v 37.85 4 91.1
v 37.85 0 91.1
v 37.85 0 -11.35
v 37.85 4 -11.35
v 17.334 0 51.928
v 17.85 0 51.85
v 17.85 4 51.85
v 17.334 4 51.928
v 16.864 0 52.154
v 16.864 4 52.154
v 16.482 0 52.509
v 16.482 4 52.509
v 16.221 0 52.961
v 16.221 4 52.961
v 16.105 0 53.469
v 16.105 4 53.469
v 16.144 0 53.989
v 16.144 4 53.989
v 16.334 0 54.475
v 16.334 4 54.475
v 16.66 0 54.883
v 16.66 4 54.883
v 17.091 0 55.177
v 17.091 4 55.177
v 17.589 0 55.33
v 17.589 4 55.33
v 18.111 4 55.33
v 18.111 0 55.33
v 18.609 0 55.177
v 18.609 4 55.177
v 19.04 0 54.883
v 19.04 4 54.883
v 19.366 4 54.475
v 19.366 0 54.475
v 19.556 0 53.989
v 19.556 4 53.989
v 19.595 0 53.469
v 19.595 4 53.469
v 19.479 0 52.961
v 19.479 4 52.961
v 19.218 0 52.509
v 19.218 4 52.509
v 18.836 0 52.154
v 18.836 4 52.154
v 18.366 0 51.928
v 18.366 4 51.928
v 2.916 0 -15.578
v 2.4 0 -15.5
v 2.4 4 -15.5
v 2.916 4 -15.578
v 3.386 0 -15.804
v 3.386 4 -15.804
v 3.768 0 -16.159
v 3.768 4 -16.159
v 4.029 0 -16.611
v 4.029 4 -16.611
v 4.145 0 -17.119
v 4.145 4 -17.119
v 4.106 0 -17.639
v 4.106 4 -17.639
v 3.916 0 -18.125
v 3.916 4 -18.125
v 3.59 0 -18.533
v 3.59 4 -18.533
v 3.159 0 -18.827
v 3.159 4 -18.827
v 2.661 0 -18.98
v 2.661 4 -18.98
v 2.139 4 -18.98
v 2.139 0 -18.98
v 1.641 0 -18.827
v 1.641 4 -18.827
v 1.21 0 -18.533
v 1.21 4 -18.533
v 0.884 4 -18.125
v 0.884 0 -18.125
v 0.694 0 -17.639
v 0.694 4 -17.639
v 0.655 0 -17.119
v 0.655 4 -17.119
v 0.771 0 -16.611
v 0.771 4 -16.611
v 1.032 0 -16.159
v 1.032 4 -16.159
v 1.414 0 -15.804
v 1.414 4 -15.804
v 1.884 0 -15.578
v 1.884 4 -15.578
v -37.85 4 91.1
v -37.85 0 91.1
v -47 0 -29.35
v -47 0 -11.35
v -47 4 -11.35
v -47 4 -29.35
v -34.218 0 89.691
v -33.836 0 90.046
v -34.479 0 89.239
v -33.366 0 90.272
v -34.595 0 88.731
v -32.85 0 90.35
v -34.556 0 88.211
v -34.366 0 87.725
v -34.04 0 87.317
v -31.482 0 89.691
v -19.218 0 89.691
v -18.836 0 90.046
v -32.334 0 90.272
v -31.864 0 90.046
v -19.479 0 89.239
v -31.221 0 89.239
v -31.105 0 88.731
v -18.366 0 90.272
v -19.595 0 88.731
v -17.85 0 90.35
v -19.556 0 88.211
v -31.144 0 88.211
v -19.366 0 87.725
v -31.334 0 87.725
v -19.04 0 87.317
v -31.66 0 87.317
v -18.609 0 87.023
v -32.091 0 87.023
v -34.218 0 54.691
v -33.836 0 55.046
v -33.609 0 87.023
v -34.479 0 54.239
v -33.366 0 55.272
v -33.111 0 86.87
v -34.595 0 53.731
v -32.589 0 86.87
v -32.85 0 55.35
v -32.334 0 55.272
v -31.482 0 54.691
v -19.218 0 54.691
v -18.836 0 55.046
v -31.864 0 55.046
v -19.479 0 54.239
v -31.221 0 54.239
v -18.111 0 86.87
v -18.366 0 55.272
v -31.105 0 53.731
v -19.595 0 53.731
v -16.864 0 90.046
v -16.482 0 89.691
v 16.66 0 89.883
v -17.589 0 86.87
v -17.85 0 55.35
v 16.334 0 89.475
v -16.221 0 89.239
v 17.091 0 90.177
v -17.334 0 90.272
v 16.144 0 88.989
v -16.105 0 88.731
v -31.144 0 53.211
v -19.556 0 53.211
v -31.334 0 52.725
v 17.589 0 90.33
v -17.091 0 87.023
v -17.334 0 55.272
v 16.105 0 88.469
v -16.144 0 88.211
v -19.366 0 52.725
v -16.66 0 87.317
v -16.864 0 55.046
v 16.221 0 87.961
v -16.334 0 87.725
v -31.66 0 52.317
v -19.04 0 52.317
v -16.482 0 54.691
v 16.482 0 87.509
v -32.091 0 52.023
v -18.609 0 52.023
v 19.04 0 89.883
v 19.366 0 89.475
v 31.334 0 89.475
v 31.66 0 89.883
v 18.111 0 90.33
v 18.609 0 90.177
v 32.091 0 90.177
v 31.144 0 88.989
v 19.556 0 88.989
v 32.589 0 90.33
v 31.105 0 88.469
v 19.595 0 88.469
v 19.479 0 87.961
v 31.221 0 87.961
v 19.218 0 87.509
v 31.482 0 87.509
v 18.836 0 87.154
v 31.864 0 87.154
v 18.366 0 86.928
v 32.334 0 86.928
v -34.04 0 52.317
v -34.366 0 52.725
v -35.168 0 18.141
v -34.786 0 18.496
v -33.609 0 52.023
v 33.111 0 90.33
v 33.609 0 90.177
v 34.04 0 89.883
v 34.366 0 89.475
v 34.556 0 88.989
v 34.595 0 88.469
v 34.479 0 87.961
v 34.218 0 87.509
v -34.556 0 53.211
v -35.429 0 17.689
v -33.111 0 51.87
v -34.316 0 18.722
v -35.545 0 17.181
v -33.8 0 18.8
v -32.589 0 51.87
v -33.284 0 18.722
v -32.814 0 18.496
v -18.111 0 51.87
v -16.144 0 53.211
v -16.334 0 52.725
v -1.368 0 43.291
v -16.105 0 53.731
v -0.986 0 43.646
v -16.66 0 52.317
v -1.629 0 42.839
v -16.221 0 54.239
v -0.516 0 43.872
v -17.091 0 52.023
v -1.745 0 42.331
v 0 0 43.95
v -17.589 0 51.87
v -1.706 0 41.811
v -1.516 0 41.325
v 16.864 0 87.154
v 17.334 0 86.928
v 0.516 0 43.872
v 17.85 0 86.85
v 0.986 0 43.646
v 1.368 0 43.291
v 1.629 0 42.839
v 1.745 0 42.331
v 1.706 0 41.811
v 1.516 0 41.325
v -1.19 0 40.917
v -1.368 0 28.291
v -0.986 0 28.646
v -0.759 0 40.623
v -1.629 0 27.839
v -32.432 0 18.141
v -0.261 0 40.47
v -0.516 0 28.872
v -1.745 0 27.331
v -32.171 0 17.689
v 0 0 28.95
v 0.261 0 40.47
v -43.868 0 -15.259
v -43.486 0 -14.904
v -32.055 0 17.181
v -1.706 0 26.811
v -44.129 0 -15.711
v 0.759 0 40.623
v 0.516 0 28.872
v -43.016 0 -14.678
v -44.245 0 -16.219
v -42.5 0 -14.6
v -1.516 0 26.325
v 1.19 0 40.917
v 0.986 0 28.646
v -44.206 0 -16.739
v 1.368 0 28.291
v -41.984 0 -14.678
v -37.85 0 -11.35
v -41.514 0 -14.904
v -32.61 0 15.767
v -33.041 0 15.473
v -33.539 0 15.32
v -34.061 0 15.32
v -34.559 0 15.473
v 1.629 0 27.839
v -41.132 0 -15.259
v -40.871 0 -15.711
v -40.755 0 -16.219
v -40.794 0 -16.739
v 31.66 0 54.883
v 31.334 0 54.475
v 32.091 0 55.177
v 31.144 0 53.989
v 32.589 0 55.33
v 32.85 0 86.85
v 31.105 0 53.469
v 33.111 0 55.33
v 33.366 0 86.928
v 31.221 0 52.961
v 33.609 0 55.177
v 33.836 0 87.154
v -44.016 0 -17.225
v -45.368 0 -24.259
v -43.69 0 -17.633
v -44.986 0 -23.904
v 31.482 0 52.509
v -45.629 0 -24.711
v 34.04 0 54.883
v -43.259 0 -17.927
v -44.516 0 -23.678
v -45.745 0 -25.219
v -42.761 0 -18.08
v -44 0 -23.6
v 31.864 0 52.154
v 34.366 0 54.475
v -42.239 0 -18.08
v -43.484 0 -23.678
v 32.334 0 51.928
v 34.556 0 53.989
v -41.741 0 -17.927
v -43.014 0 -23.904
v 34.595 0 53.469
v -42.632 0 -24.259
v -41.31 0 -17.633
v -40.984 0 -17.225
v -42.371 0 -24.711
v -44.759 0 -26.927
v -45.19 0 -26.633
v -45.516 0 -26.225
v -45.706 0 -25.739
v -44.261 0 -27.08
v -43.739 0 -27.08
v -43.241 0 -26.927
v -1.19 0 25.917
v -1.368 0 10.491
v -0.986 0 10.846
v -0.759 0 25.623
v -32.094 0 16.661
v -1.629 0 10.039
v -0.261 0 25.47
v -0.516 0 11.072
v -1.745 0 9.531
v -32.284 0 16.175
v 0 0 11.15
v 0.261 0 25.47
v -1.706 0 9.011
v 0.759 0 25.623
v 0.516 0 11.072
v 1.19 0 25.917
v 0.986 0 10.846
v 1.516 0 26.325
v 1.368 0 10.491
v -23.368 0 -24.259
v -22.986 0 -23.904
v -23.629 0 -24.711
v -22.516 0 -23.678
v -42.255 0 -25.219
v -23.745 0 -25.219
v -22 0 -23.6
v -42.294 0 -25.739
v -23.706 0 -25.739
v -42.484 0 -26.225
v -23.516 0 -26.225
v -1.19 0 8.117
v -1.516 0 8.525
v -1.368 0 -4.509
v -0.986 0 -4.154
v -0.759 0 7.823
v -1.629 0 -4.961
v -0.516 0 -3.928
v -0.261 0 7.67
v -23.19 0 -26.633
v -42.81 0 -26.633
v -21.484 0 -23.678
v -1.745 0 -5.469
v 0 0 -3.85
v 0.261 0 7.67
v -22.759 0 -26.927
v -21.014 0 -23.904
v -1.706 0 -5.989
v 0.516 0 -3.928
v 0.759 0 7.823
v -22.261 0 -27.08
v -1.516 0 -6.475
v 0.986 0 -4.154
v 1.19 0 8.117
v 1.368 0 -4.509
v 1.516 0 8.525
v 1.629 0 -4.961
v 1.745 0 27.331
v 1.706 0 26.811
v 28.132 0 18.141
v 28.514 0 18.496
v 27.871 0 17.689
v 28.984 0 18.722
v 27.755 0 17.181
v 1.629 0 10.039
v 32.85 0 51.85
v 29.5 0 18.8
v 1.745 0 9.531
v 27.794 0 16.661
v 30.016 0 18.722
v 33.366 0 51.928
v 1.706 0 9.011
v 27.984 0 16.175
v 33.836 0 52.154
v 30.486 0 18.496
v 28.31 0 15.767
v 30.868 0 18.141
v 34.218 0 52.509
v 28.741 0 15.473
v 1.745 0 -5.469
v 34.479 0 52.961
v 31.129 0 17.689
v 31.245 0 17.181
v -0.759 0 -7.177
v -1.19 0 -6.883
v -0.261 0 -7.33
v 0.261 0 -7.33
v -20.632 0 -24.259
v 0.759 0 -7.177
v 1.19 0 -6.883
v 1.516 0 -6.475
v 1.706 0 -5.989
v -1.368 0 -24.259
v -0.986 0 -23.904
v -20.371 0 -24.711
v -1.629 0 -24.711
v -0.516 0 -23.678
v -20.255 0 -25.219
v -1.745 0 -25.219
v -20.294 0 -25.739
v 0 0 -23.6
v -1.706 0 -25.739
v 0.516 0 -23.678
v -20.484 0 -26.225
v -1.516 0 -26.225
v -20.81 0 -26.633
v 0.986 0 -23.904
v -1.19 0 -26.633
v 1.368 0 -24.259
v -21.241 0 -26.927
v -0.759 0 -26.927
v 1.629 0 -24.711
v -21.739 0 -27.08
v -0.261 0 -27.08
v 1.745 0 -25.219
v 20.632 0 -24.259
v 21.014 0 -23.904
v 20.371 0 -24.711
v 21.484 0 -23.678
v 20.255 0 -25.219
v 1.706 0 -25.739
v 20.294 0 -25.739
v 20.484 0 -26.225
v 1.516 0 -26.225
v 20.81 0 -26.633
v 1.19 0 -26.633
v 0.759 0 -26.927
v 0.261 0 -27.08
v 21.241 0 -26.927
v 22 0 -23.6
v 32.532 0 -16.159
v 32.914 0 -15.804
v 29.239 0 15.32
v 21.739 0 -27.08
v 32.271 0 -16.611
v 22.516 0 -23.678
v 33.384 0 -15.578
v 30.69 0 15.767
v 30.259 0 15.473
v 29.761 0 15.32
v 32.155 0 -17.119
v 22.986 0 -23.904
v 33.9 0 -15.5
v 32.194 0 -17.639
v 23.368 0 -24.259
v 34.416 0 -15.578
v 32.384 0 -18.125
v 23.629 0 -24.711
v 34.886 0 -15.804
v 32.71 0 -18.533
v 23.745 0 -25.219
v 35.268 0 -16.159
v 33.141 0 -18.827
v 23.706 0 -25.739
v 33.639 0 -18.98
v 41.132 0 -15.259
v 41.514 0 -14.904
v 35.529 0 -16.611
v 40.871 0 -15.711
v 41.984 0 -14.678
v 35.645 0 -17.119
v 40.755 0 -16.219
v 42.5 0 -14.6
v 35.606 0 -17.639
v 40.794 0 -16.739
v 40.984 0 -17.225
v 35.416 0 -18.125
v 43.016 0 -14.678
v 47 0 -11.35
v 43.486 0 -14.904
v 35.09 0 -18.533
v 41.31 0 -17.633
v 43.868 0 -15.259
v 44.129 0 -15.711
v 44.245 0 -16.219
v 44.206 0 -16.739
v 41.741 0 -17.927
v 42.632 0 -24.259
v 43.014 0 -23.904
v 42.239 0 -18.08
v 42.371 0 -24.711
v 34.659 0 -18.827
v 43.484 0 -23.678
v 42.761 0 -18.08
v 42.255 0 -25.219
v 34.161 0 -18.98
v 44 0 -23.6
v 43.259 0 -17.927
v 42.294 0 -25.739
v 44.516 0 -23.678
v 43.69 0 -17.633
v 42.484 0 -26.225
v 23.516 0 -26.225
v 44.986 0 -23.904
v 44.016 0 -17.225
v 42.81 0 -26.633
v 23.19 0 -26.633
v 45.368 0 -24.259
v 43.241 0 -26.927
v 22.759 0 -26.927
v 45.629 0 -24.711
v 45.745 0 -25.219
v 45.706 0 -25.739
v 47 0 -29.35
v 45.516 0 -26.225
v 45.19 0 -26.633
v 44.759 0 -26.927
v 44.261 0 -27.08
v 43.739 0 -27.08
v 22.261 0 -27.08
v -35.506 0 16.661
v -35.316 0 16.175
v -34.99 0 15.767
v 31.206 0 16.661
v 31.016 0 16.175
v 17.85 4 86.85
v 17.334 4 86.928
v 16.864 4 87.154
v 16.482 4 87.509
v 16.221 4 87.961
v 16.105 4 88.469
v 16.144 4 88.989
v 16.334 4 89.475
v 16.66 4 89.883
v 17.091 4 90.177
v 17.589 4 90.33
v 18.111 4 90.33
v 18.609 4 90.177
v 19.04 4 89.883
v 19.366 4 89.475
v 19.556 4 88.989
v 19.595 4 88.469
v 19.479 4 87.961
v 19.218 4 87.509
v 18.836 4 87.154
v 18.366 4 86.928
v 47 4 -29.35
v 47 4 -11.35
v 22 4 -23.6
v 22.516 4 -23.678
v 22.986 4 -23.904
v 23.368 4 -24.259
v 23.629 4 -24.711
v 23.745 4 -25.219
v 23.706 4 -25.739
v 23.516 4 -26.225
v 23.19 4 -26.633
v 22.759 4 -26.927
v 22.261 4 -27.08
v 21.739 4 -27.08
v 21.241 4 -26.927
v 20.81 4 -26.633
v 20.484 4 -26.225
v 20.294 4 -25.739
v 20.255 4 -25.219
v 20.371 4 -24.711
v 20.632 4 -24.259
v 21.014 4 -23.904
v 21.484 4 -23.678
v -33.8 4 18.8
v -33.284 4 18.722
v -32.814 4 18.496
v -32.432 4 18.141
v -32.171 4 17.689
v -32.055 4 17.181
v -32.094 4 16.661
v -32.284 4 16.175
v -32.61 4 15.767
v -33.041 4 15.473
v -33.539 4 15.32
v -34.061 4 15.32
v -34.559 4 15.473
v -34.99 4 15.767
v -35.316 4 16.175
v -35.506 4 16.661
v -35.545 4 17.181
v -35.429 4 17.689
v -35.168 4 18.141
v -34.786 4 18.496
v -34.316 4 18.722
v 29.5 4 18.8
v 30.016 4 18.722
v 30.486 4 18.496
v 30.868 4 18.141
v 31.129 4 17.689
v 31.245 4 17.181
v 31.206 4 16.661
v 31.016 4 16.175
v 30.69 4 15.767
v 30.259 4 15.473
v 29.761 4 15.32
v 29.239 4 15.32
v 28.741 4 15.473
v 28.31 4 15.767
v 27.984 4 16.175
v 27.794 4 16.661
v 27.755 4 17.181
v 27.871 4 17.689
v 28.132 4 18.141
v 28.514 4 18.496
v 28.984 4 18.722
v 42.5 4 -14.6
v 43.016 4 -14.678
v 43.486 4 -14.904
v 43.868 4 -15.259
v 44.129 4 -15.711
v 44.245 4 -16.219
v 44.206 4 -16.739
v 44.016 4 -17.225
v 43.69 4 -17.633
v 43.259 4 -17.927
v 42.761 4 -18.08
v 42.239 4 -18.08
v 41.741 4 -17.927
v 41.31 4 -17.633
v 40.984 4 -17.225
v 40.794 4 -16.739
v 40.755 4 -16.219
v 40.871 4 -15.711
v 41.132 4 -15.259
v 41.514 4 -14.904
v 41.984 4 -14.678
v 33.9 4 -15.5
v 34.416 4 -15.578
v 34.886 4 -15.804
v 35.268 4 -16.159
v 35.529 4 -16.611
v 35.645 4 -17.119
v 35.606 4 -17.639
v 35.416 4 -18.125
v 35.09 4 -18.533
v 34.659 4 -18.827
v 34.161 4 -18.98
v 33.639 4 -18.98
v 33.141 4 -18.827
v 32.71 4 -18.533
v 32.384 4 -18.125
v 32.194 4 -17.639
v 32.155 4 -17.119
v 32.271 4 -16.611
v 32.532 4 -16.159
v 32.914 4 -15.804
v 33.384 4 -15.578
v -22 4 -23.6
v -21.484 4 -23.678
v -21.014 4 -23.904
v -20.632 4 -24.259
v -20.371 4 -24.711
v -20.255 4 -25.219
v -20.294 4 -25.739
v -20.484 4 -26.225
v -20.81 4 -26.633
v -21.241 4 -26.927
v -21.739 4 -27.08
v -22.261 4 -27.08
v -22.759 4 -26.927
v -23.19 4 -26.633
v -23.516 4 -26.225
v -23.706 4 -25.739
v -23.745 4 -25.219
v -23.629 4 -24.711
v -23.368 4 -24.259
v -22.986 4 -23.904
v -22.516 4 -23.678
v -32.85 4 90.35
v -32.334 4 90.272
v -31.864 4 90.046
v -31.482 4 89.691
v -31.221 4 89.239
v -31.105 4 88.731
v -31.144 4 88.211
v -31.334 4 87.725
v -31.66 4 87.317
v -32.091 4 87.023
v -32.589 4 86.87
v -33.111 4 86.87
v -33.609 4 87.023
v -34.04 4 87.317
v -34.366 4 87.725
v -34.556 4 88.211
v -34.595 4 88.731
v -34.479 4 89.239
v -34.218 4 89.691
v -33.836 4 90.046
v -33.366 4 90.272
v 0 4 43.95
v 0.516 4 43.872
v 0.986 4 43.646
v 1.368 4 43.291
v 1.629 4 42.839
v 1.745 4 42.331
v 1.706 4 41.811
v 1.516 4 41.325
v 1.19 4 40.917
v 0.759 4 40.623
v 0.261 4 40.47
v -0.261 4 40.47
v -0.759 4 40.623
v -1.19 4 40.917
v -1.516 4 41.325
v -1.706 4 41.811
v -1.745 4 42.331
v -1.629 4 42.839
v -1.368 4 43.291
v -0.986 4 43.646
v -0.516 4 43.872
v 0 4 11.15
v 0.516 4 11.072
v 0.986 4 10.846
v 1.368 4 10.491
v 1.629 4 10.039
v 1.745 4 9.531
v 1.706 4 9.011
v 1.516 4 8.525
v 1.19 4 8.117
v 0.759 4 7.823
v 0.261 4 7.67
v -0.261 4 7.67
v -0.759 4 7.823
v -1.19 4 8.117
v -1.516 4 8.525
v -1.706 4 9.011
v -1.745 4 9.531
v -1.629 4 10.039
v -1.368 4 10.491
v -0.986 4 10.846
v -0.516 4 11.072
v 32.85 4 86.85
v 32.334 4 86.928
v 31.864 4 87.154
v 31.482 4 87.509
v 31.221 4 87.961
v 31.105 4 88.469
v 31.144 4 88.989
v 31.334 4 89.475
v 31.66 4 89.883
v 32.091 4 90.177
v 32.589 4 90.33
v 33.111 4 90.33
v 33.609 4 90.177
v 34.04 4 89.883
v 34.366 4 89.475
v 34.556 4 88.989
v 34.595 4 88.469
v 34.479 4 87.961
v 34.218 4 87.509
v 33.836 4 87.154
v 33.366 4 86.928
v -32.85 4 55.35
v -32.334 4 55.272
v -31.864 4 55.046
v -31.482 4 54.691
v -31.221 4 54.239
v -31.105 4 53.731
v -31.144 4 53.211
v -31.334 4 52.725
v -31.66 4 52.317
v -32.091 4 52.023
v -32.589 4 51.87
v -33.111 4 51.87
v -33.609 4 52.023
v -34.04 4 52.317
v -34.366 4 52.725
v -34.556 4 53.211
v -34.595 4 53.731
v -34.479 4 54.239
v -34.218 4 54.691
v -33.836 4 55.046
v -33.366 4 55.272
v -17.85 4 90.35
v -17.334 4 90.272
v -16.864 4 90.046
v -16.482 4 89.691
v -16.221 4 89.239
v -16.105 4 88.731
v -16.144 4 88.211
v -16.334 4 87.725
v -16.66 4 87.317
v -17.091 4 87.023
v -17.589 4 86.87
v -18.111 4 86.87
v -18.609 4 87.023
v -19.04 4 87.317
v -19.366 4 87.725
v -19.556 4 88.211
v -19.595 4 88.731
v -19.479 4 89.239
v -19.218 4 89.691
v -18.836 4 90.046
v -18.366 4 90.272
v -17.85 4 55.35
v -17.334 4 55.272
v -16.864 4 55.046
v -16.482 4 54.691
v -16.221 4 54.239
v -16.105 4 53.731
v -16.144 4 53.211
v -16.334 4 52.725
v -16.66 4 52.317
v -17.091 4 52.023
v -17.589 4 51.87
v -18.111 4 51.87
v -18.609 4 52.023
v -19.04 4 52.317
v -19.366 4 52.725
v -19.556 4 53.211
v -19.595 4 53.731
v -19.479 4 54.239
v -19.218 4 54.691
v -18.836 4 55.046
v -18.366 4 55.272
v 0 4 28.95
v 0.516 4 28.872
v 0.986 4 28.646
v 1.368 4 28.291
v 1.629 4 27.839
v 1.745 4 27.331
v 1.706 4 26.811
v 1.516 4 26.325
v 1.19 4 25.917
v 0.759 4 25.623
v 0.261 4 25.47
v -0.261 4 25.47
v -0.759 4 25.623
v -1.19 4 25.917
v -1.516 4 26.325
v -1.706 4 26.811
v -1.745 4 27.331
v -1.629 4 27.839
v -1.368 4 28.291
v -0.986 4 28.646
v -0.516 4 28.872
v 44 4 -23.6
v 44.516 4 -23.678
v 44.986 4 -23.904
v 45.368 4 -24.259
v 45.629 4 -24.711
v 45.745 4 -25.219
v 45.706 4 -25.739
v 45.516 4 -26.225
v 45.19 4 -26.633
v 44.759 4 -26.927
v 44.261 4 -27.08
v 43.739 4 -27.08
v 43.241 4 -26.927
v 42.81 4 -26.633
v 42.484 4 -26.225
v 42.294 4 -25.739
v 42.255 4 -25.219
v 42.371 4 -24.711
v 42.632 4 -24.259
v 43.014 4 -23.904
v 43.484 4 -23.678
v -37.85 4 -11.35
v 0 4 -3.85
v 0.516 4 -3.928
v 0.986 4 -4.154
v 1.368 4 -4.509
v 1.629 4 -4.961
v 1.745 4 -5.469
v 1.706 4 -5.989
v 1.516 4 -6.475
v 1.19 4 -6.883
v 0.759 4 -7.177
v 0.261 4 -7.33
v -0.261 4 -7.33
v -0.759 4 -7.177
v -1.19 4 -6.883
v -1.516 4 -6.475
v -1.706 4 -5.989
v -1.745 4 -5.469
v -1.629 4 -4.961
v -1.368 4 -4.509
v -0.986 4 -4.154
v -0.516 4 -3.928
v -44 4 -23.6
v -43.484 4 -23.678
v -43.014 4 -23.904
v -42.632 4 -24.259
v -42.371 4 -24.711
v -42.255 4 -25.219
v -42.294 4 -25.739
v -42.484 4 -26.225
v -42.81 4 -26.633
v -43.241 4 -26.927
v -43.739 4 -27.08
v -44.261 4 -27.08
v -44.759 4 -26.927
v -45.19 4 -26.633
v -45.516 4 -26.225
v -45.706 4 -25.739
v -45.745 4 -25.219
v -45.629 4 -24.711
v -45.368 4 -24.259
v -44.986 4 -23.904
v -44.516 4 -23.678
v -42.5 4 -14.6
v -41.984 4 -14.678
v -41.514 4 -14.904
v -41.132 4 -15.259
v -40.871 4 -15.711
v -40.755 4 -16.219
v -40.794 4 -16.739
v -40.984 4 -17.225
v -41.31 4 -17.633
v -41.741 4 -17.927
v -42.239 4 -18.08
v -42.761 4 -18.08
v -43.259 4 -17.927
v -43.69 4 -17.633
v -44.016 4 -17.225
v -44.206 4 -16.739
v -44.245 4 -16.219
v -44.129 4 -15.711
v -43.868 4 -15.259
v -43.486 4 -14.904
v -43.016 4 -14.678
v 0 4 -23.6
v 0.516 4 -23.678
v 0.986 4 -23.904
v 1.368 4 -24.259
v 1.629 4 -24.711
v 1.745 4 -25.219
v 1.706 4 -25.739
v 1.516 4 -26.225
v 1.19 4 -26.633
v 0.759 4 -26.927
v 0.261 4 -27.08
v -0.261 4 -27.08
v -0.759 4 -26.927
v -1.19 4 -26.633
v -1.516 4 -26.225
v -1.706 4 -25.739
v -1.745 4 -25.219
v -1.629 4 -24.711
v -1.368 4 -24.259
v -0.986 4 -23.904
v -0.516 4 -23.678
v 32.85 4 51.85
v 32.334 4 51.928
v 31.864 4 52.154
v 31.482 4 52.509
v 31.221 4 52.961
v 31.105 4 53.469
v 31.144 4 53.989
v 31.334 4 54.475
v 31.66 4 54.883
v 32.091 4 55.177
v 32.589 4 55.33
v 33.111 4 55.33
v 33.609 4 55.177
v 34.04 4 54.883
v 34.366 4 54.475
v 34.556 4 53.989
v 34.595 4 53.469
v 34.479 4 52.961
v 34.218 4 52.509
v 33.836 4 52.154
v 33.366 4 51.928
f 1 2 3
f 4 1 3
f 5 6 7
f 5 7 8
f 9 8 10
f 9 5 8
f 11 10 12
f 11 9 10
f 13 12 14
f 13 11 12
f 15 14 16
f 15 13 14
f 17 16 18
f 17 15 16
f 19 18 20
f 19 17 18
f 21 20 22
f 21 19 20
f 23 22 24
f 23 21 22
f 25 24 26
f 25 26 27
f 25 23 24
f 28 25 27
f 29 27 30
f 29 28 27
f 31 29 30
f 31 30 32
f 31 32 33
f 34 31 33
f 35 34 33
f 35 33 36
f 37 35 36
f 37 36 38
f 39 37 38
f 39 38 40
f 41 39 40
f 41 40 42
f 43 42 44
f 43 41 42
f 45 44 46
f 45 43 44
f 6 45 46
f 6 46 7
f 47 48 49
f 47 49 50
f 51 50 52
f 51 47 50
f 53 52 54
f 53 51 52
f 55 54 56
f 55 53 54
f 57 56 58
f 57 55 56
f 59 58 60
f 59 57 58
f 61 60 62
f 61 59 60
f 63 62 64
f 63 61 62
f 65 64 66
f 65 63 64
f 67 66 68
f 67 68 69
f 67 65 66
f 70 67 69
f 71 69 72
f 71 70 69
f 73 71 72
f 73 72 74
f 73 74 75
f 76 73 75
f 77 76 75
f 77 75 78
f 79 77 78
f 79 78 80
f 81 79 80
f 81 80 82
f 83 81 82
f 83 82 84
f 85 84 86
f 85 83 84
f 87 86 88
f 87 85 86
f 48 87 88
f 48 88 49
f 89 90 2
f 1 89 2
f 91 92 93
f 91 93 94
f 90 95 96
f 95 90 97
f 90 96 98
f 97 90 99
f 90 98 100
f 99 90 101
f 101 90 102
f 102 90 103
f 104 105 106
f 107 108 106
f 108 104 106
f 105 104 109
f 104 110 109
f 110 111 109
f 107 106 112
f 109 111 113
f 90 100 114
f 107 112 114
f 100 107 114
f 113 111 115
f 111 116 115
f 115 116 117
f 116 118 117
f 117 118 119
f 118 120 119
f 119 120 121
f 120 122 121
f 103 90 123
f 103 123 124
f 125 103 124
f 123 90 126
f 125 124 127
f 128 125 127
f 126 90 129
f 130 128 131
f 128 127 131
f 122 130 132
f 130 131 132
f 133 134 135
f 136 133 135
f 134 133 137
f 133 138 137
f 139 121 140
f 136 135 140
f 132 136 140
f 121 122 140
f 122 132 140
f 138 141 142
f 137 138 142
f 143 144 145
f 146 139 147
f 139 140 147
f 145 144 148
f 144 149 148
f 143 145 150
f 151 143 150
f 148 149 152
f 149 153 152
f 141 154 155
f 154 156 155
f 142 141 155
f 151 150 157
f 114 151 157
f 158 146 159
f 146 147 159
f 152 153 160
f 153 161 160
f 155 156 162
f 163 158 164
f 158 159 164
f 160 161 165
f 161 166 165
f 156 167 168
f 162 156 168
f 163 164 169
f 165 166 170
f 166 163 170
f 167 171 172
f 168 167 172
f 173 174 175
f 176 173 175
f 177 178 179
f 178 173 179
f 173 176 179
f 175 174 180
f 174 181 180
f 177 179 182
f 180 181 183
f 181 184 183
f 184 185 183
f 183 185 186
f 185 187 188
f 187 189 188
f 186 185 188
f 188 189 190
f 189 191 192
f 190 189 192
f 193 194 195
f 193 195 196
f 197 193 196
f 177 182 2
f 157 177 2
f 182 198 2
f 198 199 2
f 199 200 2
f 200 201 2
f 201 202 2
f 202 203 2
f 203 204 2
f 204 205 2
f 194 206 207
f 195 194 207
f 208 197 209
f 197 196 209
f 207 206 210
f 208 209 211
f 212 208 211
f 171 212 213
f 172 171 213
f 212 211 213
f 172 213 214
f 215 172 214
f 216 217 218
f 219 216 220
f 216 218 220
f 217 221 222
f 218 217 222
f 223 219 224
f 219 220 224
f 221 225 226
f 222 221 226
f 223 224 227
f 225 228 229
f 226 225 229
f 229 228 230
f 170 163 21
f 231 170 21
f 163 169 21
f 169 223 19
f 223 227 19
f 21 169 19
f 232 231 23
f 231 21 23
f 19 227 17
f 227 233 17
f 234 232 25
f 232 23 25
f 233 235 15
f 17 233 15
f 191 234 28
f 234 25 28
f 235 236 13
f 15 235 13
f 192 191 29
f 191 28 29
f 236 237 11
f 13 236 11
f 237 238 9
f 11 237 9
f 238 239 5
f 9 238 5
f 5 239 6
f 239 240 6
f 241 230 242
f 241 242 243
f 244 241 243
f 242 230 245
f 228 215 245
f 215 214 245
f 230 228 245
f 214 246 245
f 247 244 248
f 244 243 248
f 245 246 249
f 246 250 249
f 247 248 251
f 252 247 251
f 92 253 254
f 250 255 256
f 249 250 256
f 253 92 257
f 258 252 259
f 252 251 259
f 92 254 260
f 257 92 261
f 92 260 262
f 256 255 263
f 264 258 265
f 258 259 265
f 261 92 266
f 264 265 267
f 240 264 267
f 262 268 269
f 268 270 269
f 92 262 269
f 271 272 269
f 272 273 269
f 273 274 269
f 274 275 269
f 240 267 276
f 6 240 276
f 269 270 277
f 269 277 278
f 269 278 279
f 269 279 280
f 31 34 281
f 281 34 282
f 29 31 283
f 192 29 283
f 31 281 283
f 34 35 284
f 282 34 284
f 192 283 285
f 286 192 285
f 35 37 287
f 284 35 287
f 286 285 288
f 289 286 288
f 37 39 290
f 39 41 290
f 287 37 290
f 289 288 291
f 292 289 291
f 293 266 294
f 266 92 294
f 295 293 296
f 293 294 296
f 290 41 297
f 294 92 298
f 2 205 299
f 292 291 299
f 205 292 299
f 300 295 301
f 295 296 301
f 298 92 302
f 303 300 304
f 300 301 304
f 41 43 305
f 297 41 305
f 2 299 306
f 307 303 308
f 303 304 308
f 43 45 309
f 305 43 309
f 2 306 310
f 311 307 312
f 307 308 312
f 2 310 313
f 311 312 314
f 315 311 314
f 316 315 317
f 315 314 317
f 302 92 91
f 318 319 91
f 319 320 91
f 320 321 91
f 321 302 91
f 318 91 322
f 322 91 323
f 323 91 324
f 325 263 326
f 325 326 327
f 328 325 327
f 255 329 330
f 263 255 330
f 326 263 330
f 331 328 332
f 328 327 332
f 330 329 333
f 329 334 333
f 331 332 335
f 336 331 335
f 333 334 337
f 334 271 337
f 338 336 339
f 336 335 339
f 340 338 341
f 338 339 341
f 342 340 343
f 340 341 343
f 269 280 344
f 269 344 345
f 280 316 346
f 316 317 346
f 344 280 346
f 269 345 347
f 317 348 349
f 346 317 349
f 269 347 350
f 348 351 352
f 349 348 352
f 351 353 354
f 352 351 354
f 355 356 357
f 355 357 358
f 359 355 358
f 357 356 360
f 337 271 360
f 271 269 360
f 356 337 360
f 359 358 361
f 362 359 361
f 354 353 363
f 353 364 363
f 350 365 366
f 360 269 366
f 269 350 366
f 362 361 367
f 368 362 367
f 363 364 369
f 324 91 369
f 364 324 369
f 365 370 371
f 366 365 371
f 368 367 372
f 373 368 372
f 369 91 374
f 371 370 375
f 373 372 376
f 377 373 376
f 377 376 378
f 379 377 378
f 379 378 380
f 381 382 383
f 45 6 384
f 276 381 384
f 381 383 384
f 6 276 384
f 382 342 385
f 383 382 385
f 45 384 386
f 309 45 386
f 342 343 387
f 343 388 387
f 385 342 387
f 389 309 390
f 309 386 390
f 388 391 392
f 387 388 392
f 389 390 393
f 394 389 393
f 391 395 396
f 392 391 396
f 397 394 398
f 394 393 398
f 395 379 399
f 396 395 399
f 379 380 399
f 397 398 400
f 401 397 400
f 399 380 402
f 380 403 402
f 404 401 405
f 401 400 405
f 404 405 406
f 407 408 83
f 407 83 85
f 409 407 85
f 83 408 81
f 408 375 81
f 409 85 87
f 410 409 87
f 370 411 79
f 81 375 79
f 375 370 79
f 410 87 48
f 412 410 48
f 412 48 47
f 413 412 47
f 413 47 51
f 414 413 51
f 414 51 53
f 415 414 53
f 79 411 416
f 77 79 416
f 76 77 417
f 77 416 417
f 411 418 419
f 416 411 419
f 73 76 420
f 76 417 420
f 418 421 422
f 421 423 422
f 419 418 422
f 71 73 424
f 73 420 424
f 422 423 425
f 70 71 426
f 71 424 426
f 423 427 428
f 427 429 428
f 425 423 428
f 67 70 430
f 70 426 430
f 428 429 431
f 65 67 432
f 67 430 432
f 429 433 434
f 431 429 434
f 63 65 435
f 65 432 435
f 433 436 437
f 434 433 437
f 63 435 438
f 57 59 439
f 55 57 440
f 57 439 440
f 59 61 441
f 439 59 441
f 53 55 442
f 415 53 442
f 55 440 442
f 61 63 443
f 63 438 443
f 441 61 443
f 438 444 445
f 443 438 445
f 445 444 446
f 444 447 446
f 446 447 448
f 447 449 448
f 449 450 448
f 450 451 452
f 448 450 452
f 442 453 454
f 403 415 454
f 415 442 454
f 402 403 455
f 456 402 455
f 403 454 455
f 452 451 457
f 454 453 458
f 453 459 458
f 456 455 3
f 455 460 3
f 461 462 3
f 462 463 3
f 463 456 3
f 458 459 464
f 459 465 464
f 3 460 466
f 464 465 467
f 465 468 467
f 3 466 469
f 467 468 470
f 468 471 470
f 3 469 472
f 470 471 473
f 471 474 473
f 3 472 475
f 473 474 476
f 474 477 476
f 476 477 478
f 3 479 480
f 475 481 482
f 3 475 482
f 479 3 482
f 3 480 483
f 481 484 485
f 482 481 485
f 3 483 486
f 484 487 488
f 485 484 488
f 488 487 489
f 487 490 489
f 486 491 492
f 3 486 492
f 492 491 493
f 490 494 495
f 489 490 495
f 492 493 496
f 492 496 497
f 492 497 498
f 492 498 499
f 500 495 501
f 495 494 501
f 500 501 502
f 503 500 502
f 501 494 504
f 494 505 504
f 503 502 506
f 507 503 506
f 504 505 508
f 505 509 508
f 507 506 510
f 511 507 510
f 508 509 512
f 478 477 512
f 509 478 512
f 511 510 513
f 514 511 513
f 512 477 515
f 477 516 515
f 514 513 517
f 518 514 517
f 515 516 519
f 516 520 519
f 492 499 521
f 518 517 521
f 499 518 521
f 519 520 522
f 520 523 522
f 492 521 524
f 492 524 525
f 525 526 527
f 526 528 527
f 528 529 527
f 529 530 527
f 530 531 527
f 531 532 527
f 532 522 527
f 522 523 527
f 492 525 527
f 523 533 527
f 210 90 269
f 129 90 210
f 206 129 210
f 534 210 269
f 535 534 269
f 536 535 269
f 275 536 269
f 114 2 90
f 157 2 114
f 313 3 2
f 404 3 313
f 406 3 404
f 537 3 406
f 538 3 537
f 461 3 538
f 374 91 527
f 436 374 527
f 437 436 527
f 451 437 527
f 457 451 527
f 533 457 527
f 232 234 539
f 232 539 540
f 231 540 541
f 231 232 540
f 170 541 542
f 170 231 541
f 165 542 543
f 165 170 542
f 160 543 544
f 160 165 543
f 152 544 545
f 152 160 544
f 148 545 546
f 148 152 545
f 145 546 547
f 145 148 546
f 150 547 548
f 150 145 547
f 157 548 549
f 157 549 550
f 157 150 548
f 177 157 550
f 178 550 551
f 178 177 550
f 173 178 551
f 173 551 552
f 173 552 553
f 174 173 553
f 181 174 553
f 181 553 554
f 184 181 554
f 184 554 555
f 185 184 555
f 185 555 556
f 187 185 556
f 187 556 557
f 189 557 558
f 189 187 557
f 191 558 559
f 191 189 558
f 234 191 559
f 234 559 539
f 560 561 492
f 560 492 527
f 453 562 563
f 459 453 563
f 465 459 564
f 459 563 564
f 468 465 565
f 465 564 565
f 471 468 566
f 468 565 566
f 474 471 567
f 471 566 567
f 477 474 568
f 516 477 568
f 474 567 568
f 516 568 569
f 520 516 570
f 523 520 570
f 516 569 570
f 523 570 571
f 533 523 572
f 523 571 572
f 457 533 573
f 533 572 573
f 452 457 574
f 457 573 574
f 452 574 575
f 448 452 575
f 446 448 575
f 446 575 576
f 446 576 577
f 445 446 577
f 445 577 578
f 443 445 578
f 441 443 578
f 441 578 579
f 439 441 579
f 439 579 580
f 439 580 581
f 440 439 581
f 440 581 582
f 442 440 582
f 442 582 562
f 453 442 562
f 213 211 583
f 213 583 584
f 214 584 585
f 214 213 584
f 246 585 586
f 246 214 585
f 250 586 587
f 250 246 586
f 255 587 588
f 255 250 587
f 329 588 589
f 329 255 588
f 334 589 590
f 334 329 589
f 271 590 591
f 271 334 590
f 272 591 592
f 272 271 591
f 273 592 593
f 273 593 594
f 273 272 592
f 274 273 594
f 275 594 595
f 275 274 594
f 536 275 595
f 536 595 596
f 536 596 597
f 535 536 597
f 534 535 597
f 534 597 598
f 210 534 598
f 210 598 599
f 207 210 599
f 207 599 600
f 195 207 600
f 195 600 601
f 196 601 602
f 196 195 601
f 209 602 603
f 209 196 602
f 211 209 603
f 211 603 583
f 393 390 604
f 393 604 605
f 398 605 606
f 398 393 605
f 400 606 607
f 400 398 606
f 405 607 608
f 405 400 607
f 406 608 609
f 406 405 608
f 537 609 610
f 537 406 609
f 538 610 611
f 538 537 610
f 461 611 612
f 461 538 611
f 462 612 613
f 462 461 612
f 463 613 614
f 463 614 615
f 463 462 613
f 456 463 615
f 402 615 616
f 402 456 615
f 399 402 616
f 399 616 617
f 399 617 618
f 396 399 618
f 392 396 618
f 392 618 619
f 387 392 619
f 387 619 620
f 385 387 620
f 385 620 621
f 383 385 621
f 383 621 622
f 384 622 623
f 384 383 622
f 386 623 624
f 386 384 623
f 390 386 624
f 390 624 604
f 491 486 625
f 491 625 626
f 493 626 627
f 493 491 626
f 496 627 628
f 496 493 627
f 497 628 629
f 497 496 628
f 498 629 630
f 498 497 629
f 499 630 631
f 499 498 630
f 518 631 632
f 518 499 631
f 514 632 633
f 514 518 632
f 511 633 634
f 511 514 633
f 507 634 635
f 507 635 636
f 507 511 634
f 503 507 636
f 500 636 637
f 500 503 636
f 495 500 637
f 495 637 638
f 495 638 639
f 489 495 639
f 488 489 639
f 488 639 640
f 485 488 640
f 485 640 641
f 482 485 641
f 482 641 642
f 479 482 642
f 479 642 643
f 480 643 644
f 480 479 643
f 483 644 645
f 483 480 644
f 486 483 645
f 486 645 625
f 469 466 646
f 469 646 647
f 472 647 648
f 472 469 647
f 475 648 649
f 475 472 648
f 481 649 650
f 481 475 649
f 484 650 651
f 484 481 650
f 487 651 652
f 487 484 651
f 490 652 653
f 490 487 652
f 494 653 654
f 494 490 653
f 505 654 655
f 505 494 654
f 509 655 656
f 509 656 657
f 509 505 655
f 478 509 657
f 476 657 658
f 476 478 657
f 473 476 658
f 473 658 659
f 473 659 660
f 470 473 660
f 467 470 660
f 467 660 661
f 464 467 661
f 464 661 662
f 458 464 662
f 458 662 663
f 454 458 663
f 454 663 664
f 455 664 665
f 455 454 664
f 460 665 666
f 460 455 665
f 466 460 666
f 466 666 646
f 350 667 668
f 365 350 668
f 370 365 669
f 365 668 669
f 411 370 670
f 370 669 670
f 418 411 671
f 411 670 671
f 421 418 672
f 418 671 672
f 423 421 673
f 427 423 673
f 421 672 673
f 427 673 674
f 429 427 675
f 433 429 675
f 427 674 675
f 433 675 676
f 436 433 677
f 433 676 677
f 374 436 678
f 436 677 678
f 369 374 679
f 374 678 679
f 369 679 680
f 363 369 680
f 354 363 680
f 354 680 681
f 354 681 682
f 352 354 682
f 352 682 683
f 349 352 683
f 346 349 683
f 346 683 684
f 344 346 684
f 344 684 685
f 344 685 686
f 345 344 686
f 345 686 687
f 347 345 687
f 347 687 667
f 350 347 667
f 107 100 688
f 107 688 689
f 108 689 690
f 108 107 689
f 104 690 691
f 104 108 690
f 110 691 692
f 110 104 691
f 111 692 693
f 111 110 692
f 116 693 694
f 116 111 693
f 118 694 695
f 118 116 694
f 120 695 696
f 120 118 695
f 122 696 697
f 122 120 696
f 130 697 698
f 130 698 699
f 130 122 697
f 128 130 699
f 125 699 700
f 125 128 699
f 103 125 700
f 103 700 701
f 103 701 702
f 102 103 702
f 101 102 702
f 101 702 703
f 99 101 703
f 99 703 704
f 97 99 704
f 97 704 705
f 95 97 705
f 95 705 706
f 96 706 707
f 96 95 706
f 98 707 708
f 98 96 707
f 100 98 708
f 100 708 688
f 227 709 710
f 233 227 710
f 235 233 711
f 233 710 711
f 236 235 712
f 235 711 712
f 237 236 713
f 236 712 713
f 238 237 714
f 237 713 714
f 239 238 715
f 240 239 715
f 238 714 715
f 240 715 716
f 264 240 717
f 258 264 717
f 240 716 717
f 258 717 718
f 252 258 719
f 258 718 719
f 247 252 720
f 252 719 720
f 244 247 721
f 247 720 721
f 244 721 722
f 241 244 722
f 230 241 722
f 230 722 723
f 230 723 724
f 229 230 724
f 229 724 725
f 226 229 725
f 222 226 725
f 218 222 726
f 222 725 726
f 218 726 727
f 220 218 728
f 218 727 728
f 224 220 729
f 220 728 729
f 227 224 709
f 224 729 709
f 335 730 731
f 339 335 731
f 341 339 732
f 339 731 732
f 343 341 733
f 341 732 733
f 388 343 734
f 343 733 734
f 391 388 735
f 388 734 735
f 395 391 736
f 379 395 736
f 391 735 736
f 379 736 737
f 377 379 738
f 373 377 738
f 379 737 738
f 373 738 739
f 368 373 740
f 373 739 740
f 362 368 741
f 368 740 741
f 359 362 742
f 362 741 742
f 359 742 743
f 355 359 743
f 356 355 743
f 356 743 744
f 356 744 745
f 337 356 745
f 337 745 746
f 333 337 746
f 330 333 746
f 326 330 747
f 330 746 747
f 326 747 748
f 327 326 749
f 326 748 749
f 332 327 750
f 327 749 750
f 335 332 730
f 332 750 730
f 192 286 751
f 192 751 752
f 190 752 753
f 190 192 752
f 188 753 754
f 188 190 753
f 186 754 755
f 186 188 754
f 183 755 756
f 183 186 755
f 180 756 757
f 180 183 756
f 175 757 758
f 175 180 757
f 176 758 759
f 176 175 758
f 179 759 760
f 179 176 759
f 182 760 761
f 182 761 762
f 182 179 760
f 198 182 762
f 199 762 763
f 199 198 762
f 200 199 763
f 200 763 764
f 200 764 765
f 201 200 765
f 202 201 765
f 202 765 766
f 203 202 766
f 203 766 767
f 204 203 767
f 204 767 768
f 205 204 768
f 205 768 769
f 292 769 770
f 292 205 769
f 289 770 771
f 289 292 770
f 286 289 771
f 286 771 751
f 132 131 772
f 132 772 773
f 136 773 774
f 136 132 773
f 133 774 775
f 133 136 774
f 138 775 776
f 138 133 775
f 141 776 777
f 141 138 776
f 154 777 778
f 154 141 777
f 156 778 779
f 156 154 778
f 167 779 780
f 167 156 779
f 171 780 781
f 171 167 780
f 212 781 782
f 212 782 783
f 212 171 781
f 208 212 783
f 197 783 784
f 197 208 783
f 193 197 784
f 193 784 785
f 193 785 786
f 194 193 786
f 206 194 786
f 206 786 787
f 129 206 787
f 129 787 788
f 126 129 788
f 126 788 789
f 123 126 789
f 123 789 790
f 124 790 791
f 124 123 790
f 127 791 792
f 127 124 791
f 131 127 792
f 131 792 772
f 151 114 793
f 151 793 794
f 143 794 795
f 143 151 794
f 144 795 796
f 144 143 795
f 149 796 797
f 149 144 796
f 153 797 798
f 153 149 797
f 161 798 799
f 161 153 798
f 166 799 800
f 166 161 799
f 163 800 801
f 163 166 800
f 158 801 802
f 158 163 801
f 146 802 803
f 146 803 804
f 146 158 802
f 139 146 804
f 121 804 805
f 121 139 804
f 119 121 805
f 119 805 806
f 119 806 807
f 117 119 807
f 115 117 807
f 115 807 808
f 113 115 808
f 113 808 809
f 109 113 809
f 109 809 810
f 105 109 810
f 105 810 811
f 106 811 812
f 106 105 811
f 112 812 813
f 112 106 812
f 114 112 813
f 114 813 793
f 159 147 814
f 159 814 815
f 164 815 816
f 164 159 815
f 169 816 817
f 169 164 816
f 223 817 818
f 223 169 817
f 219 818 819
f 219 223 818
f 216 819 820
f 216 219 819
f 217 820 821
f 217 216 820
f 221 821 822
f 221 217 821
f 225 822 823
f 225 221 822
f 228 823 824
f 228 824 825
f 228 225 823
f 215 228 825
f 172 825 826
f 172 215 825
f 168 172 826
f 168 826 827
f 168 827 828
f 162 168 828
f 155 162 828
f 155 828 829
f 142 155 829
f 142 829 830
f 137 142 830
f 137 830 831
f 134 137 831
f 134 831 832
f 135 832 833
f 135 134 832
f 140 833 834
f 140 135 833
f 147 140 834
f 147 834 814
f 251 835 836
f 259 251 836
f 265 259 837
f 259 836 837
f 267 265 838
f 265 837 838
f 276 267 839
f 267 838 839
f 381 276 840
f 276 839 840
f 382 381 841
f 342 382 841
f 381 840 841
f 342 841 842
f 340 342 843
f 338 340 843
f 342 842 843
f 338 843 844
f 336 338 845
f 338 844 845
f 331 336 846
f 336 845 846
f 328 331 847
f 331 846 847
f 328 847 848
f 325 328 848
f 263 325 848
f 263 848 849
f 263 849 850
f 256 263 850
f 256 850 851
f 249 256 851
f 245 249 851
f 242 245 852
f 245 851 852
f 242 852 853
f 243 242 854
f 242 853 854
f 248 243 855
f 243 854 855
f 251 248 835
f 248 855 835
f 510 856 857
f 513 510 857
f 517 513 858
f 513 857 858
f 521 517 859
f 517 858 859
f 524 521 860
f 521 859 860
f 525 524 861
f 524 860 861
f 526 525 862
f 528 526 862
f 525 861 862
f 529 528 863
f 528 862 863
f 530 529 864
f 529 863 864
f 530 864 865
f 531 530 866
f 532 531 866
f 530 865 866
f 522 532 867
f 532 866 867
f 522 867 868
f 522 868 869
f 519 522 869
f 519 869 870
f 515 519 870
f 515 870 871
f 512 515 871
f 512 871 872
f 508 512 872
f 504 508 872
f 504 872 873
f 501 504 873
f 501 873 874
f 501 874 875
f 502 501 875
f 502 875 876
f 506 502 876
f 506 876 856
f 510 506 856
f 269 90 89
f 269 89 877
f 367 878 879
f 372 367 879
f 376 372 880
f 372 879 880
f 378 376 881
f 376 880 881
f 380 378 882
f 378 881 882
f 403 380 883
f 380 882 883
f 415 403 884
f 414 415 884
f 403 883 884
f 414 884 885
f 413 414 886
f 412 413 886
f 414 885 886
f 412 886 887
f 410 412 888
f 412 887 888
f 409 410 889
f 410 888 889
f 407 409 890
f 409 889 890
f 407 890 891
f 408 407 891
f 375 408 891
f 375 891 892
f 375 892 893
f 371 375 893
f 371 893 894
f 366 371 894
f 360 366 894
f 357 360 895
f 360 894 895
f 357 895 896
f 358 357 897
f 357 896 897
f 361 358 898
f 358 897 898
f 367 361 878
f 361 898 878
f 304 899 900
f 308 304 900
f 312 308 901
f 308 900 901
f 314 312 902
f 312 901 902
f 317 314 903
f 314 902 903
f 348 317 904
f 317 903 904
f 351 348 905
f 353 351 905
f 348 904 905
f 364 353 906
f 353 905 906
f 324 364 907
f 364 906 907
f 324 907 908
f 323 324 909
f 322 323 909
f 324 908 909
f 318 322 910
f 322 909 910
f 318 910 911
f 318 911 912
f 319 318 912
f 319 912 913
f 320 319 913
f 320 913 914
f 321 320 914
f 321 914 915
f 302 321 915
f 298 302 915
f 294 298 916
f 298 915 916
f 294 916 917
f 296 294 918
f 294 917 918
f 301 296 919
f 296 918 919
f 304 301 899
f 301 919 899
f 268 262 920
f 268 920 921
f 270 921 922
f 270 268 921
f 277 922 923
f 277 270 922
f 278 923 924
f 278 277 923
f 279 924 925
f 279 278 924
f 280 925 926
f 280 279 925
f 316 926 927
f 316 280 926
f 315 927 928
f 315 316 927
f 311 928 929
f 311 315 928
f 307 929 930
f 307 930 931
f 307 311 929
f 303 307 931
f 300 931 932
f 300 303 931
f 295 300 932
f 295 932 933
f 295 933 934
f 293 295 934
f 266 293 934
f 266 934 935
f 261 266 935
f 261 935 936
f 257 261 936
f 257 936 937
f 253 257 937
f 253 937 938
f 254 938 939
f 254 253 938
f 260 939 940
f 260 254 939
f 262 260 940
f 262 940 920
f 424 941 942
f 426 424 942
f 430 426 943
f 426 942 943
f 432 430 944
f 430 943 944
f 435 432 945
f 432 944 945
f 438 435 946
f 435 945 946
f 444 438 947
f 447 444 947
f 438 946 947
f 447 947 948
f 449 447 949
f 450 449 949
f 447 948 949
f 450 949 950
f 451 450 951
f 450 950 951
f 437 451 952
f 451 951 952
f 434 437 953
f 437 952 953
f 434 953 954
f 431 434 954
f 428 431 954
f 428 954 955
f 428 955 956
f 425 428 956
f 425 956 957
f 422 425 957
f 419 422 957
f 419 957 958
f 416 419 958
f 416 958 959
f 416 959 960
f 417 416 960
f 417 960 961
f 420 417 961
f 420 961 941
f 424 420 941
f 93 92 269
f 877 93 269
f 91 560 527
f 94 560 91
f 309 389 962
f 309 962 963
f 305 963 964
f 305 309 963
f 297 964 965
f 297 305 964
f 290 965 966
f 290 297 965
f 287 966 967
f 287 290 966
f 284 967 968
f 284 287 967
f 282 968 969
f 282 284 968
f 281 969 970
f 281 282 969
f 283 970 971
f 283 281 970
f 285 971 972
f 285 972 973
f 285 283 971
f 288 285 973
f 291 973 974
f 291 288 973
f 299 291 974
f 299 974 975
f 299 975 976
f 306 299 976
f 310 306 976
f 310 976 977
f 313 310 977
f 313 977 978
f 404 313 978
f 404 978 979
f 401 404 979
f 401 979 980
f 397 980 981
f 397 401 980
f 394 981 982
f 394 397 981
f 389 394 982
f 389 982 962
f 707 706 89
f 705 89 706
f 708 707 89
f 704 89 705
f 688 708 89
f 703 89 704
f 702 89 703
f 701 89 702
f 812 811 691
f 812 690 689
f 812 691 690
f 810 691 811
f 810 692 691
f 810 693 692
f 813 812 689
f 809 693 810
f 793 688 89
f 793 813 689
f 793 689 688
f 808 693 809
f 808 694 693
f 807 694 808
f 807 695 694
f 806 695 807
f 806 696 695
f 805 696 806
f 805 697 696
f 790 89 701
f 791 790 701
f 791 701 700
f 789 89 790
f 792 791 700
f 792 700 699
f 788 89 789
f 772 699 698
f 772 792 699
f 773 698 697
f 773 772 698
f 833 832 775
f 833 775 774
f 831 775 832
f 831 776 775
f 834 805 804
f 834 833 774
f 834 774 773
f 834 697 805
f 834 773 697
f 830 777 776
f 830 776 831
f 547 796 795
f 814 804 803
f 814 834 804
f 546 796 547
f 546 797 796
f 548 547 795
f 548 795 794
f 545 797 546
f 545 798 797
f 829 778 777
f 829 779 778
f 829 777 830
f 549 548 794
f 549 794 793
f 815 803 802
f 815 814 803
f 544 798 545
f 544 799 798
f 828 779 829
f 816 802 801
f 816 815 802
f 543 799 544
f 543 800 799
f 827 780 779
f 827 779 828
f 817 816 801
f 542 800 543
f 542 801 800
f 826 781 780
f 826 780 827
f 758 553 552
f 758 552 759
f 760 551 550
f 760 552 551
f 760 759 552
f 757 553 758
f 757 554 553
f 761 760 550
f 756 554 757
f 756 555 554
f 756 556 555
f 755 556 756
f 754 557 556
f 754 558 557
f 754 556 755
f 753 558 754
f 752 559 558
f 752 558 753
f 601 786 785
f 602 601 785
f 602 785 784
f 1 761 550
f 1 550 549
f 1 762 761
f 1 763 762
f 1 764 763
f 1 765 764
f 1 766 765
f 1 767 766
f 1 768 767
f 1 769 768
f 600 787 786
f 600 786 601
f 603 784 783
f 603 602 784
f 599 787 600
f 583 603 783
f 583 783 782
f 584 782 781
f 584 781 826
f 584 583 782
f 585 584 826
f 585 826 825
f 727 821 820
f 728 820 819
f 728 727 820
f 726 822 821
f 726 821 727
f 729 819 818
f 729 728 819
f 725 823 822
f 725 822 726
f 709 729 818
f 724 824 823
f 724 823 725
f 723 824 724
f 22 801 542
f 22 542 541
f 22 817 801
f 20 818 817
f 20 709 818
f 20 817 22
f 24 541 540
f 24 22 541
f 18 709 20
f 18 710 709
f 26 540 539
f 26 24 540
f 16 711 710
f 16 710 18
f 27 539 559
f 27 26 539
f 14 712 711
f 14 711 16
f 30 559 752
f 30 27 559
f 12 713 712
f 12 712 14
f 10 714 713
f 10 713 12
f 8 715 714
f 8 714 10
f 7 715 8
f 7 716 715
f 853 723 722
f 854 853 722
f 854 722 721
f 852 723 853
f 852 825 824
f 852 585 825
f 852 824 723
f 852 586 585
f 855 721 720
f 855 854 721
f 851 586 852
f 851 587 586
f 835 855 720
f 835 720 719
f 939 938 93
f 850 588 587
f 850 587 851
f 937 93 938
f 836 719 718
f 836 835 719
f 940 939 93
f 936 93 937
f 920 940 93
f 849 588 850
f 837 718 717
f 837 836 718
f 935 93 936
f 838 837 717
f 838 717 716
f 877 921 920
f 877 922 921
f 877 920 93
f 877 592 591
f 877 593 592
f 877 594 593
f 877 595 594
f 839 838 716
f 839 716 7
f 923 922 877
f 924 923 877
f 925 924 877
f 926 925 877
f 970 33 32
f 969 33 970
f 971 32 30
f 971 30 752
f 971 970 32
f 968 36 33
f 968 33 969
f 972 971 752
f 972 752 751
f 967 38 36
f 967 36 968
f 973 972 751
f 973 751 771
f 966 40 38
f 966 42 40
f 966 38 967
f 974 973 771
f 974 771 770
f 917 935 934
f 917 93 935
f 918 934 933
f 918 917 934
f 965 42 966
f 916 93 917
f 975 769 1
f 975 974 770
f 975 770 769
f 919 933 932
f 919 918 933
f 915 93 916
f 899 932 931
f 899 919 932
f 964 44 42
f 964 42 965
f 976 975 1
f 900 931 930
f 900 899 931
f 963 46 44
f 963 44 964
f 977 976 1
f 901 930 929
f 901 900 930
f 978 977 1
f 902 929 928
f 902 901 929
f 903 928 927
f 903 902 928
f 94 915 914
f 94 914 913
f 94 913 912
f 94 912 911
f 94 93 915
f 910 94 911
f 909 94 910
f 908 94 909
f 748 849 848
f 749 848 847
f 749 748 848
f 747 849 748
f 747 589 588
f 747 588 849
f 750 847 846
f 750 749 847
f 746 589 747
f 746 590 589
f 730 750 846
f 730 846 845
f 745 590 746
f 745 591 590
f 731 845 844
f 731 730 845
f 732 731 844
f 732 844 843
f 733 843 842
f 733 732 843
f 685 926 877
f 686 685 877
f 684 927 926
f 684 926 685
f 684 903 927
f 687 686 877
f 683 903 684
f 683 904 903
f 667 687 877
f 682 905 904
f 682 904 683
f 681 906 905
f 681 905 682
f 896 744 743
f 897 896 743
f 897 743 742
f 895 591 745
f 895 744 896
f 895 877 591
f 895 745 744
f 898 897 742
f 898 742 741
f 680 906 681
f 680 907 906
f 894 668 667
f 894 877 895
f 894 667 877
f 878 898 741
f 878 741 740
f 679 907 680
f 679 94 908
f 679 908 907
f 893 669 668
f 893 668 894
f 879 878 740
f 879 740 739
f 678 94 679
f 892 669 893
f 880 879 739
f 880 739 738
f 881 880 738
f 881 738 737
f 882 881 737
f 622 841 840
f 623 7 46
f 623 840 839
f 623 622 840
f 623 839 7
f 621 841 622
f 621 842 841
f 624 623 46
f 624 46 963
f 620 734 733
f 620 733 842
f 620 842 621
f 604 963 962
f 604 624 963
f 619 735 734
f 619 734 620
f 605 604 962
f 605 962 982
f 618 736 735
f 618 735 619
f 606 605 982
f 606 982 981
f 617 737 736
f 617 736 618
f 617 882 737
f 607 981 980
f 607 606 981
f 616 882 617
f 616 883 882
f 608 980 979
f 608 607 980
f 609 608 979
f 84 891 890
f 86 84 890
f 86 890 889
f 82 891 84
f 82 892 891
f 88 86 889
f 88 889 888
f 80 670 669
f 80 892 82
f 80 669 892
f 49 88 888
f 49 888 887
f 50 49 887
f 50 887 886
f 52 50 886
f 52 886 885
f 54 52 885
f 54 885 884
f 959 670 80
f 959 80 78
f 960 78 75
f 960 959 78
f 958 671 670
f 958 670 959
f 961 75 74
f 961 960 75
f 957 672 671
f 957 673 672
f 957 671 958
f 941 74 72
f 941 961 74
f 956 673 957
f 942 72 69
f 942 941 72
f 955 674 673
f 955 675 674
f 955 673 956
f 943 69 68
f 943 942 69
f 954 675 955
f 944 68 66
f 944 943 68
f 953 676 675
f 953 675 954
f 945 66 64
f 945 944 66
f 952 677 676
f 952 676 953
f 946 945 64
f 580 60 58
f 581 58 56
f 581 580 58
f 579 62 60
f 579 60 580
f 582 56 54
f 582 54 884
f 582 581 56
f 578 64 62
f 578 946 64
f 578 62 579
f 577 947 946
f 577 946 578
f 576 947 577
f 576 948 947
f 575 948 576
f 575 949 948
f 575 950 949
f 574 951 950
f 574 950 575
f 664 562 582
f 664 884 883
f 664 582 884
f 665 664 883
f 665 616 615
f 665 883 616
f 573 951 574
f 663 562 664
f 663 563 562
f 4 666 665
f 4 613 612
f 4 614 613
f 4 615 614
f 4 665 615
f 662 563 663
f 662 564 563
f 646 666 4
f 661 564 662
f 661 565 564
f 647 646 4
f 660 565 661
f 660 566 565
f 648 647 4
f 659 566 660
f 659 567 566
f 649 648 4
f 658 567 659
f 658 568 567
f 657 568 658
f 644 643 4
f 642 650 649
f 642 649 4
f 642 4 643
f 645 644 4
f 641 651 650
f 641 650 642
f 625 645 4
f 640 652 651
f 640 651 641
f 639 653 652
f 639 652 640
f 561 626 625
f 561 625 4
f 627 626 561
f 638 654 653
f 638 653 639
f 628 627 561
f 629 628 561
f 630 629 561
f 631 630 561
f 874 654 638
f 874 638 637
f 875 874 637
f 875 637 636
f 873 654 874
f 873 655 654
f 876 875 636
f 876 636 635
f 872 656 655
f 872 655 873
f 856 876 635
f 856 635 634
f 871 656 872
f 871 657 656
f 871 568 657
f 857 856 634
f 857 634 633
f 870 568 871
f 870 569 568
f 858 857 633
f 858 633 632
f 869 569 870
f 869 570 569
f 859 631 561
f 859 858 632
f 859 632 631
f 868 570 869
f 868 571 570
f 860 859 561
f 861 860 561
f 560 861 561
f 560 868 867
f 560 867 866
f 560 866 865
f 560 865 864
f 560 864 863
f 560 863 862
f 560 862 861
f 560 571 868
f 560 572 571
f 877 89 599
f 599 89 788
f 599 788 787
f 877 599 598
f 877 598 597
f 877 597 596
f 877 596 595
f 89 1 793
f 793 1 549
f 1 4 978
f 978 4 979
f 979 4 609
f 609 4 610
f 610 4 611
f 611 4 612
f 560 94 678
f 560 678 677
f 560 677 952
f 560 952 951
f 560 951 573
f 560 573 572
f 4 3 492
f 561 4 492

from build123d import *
from build123d.topology import SkipClean

# Parameters (mm, degrees)
SKETCH1_W           = 75.7
SKETCH1_H           = 42.7
SKETCH1_R           = 1.75
BOSS_EXTRUDE1_DEPTH = 4
SKETCH3_W           = 75.7
SKETCH3_H           = 29.75
SKETCH3_R           = 1.75
BOSS_EXTRUDE2_DEPTH = 4
SKETCH3_3_R         = 1.75
CUT_EXTRUDE1_DEPTH  = 4
SKETCH4_W           = 75.7
SKETCH4_H           = 40
SKETCH4_R           = 1.75
BOSS_EXTRUDE3_DEPTH = 4
BOSS_EXTRUDE4_DEPTH = 4
SKETCH6_3_R         = 1.75
CUT_EXTRUDE2_DEPTH  = 103.587572347
SKETCH7_W           = 9.15
SKETCH7_H           = 10
SKETCH7_R           = 1.75
BOSS_EXTRUDE5_DEPTH = 4


with BuildPart() as part:
    # Sketch1 → Boss-Extrude1 (new body)
    with BuildSketch(Plane(origin=(0, 0, 0), x_dir=(1, 0, 0), z_dir=(0, 1, 0))):
        Rectangle(SKETCH1_W, SKETCH1_H)
        with Locations((2.4, 17.25)):
            Circle(SKETCH1_R, mode=Mode.SUBTRACT)
        with Locations((-33.8, -17.05)):
            Circle(SKETCH1_R, mode=Mode.SUBTRACT)
        with Locations((29.5, -17.05)):
            Circle(SKETCH1_R, mode=Mode.SUBTRACT)
        with Locations((33.9, 17.25)):
            Circle(SKETCH1_R, mode=Mode.SUBTRACT)
    extrude(amount=BOSS_EXTRUDE1_DEPTH)

    # Sketch3 → Boss-Extrude2 (add)
    with BuildSketch(Plane(origin=(0, 4, 0), x_dir=(1, 0, 0), z_dir=(0, 1, 0))):
        with Locations((0, -36.225)):
            Rectangle(SKETCH3_W, SKETCH3_H)
        with Locations((0, -42.2)):
            Circle(SKETCH3_R, mode=Mode.SUBTRACT)
        with Locations((0, -27.2)):
            Circle(SKETCH3_R, mode=Mode.SUBTRACT)
    extrude(amount=-BOSS_EXTRUDE2_DEPTH)

    # Sketch3<3> → Cut-Extrude1 (cut)
    with BuildSketch(Plane(origin=(0, 4, 0), x_dir=(1, 0, 0), z_dir=(0, 1, 0))):
        with Locations((0, 5.6)):
            Circle(SKETCH3_3_R)
        with Locations((0, -9.4)):
            Circle(SKETCH3_3_R)
    extrude(amount=-CUT_EXTRUDE1_DEPTH, mode=Mode.SUBTRACT)

    # Sketch4 → Boss-Extrude3 (add)
    # profile 1 of 2: a face of its own
    with BuildSketch(Plane(origin=(0, 0, 0), x_dir=(1, 0, 0), z_dir=(0, 1, 0))):
        with Locations((0, -71.1)):
            Rectangle(SKETCH4_W, SKETCH4_H)
        with Locations((-32.85, -53.6)):
            Circle(SKETCH4_R, mode=Mode.SUBTRACT)
        with Locations((-17.85, -53.6)):
            Circle(SKETCH4_R, mode=Mode.SUBTRACT)
        with Locations((-17.85, -88.6)):
            Circle(SKETCH4_R, mode=Mode.SUBTRACT)
        with Locations((-32.85, -88.6)):
            Circle(SKETCH4_R, mode=Mode.SUBTRACT)
        with Locations((32.85, -88.6)):
            Circle(SKETCH4_R, mode=Mode.SUBTRACT)
        with Locations((17.85, -88.6)):
            Circle(SKETCH4_R, mode=Mode.SUBTRACT)
        with Locations((17.85, -53.6)):
            Circle(SKETCH4_R, mode=Mode.SUBTRACT)
        with Locations((32.85, -53.6)):
            Circle(SKETCH4_R, mode=Mode.SUBTRACT)
    # profile 2 of 2: a face of its own
    with BuildSketch(Plane(origin=(0, 0, 0), x_dir=(1, 0, 0), z_dir=(0, 1, 0))):
        Polygon((-37.85, 21.35), (-44, 21.35), (-44, 29.35), (44, 29.35), (44, 21.35), (37.85, 21.35), align=None)
    extrude(amount=BOSS_EXTRUDE3_DEPTH)

    # Sketch6 → Boss-Extrude4 (add)
    with BuildSketch(Plane(origin=(0, 4, 0), x_dir=(1, 0, 0), z_dir=(0, 1, 0))):
        with BuildLine():
            Line((-44, 27.1), (-44, 29.35))
            Line((-44, 29.35), (-47, 29.35))
            Line((-47, 29.35), (-47, 21.35))
            Line((-47, 21.35), (-44, 21.35))
            Line((-44, 21.35), (-44, 23.6))
            ThreePointArc((-44, 23.6), (-45.75, 25.35), (-44, 27.1))
        make_face()
        with BuildLine():
            Line((47, 29.35), (44, 29.35))
            Line((44, 29.35), (44, 27.1))
            ThreePointArc((44, 27.1), (45.75, 25.35), (44, 23.6))
            Line((44, 23.6), (44, 21.35))
            Line((44, 21.35), (47, 21.35))
            Line((47, 21.35), (47, 29.35))
        make_face()
    extrude(amount=-BOSS_EXTRUDE4_DEPTH)

    # Sketch6<3> → Cut-Extrude2 (cut, through all)
    with SkipClean():  # the faces are left unmerged after this step: merging them gives an invalid solid
        with BuildSketch(Plane(origin=(0, 4, 0), x_dir=(1, 0, 0), z_dir=(0, 1, 0))):
            with Locations((0, 25.35)):
                Circle(SKETCH6_3_R)
            with Locations((22, 25.35)):
                Circle(SKETCH6_3_R)
            with Locations((44, 25.35)):
                Circle(SKETCH6_3_R)
            with Locations((-22, 25.35)):
                Circle(SKETCH6_3_R)
            with Locations((-44, 25.35)):
                Circle(SKETCH6_3_R)
        extrude(amount=-CUT_EXTRUDE2_DEPTH, mode=Mode.SUBTRACT)

    # Sketch7 → Boss-Extrude5 (add)
    # profile 1 of 2: a face of its own
    with SkipClean():  # the faces are left unmerged after this step: merging them gives an invalid solid
        with BuildSketch(Plane(origin=(0, 0, 0), x_dir=(1, 0, 0), z_dir=(0, 1, 0))):
            with Locations((-42.425, 16.35)):
                Rectangle(SKETCH7_W, SKETCH7_H)
            with Locations((-42.5, 16.35)):
                Circle(SKETCH7_R, mode=Mode.SUBTRACT)
        # profile 2 of 2: a face of its own
        with BuildSketch(Plane(origin=(0, 0, 0), x_dir=(1, 0, 0), z_dir=(0, 1, 0))):
            with Locations((42.425, 16.35)):
                Rectangle(SKETCH7_W, SKETCH7_H)
            with Locations((42.5, 16.35)):
                Circle(SKETCH7_R, mode=Mode.SUBTRACT)
        extrude(amount=BOSS_EXTRUDE5_DEPTH)


solid = part.part
